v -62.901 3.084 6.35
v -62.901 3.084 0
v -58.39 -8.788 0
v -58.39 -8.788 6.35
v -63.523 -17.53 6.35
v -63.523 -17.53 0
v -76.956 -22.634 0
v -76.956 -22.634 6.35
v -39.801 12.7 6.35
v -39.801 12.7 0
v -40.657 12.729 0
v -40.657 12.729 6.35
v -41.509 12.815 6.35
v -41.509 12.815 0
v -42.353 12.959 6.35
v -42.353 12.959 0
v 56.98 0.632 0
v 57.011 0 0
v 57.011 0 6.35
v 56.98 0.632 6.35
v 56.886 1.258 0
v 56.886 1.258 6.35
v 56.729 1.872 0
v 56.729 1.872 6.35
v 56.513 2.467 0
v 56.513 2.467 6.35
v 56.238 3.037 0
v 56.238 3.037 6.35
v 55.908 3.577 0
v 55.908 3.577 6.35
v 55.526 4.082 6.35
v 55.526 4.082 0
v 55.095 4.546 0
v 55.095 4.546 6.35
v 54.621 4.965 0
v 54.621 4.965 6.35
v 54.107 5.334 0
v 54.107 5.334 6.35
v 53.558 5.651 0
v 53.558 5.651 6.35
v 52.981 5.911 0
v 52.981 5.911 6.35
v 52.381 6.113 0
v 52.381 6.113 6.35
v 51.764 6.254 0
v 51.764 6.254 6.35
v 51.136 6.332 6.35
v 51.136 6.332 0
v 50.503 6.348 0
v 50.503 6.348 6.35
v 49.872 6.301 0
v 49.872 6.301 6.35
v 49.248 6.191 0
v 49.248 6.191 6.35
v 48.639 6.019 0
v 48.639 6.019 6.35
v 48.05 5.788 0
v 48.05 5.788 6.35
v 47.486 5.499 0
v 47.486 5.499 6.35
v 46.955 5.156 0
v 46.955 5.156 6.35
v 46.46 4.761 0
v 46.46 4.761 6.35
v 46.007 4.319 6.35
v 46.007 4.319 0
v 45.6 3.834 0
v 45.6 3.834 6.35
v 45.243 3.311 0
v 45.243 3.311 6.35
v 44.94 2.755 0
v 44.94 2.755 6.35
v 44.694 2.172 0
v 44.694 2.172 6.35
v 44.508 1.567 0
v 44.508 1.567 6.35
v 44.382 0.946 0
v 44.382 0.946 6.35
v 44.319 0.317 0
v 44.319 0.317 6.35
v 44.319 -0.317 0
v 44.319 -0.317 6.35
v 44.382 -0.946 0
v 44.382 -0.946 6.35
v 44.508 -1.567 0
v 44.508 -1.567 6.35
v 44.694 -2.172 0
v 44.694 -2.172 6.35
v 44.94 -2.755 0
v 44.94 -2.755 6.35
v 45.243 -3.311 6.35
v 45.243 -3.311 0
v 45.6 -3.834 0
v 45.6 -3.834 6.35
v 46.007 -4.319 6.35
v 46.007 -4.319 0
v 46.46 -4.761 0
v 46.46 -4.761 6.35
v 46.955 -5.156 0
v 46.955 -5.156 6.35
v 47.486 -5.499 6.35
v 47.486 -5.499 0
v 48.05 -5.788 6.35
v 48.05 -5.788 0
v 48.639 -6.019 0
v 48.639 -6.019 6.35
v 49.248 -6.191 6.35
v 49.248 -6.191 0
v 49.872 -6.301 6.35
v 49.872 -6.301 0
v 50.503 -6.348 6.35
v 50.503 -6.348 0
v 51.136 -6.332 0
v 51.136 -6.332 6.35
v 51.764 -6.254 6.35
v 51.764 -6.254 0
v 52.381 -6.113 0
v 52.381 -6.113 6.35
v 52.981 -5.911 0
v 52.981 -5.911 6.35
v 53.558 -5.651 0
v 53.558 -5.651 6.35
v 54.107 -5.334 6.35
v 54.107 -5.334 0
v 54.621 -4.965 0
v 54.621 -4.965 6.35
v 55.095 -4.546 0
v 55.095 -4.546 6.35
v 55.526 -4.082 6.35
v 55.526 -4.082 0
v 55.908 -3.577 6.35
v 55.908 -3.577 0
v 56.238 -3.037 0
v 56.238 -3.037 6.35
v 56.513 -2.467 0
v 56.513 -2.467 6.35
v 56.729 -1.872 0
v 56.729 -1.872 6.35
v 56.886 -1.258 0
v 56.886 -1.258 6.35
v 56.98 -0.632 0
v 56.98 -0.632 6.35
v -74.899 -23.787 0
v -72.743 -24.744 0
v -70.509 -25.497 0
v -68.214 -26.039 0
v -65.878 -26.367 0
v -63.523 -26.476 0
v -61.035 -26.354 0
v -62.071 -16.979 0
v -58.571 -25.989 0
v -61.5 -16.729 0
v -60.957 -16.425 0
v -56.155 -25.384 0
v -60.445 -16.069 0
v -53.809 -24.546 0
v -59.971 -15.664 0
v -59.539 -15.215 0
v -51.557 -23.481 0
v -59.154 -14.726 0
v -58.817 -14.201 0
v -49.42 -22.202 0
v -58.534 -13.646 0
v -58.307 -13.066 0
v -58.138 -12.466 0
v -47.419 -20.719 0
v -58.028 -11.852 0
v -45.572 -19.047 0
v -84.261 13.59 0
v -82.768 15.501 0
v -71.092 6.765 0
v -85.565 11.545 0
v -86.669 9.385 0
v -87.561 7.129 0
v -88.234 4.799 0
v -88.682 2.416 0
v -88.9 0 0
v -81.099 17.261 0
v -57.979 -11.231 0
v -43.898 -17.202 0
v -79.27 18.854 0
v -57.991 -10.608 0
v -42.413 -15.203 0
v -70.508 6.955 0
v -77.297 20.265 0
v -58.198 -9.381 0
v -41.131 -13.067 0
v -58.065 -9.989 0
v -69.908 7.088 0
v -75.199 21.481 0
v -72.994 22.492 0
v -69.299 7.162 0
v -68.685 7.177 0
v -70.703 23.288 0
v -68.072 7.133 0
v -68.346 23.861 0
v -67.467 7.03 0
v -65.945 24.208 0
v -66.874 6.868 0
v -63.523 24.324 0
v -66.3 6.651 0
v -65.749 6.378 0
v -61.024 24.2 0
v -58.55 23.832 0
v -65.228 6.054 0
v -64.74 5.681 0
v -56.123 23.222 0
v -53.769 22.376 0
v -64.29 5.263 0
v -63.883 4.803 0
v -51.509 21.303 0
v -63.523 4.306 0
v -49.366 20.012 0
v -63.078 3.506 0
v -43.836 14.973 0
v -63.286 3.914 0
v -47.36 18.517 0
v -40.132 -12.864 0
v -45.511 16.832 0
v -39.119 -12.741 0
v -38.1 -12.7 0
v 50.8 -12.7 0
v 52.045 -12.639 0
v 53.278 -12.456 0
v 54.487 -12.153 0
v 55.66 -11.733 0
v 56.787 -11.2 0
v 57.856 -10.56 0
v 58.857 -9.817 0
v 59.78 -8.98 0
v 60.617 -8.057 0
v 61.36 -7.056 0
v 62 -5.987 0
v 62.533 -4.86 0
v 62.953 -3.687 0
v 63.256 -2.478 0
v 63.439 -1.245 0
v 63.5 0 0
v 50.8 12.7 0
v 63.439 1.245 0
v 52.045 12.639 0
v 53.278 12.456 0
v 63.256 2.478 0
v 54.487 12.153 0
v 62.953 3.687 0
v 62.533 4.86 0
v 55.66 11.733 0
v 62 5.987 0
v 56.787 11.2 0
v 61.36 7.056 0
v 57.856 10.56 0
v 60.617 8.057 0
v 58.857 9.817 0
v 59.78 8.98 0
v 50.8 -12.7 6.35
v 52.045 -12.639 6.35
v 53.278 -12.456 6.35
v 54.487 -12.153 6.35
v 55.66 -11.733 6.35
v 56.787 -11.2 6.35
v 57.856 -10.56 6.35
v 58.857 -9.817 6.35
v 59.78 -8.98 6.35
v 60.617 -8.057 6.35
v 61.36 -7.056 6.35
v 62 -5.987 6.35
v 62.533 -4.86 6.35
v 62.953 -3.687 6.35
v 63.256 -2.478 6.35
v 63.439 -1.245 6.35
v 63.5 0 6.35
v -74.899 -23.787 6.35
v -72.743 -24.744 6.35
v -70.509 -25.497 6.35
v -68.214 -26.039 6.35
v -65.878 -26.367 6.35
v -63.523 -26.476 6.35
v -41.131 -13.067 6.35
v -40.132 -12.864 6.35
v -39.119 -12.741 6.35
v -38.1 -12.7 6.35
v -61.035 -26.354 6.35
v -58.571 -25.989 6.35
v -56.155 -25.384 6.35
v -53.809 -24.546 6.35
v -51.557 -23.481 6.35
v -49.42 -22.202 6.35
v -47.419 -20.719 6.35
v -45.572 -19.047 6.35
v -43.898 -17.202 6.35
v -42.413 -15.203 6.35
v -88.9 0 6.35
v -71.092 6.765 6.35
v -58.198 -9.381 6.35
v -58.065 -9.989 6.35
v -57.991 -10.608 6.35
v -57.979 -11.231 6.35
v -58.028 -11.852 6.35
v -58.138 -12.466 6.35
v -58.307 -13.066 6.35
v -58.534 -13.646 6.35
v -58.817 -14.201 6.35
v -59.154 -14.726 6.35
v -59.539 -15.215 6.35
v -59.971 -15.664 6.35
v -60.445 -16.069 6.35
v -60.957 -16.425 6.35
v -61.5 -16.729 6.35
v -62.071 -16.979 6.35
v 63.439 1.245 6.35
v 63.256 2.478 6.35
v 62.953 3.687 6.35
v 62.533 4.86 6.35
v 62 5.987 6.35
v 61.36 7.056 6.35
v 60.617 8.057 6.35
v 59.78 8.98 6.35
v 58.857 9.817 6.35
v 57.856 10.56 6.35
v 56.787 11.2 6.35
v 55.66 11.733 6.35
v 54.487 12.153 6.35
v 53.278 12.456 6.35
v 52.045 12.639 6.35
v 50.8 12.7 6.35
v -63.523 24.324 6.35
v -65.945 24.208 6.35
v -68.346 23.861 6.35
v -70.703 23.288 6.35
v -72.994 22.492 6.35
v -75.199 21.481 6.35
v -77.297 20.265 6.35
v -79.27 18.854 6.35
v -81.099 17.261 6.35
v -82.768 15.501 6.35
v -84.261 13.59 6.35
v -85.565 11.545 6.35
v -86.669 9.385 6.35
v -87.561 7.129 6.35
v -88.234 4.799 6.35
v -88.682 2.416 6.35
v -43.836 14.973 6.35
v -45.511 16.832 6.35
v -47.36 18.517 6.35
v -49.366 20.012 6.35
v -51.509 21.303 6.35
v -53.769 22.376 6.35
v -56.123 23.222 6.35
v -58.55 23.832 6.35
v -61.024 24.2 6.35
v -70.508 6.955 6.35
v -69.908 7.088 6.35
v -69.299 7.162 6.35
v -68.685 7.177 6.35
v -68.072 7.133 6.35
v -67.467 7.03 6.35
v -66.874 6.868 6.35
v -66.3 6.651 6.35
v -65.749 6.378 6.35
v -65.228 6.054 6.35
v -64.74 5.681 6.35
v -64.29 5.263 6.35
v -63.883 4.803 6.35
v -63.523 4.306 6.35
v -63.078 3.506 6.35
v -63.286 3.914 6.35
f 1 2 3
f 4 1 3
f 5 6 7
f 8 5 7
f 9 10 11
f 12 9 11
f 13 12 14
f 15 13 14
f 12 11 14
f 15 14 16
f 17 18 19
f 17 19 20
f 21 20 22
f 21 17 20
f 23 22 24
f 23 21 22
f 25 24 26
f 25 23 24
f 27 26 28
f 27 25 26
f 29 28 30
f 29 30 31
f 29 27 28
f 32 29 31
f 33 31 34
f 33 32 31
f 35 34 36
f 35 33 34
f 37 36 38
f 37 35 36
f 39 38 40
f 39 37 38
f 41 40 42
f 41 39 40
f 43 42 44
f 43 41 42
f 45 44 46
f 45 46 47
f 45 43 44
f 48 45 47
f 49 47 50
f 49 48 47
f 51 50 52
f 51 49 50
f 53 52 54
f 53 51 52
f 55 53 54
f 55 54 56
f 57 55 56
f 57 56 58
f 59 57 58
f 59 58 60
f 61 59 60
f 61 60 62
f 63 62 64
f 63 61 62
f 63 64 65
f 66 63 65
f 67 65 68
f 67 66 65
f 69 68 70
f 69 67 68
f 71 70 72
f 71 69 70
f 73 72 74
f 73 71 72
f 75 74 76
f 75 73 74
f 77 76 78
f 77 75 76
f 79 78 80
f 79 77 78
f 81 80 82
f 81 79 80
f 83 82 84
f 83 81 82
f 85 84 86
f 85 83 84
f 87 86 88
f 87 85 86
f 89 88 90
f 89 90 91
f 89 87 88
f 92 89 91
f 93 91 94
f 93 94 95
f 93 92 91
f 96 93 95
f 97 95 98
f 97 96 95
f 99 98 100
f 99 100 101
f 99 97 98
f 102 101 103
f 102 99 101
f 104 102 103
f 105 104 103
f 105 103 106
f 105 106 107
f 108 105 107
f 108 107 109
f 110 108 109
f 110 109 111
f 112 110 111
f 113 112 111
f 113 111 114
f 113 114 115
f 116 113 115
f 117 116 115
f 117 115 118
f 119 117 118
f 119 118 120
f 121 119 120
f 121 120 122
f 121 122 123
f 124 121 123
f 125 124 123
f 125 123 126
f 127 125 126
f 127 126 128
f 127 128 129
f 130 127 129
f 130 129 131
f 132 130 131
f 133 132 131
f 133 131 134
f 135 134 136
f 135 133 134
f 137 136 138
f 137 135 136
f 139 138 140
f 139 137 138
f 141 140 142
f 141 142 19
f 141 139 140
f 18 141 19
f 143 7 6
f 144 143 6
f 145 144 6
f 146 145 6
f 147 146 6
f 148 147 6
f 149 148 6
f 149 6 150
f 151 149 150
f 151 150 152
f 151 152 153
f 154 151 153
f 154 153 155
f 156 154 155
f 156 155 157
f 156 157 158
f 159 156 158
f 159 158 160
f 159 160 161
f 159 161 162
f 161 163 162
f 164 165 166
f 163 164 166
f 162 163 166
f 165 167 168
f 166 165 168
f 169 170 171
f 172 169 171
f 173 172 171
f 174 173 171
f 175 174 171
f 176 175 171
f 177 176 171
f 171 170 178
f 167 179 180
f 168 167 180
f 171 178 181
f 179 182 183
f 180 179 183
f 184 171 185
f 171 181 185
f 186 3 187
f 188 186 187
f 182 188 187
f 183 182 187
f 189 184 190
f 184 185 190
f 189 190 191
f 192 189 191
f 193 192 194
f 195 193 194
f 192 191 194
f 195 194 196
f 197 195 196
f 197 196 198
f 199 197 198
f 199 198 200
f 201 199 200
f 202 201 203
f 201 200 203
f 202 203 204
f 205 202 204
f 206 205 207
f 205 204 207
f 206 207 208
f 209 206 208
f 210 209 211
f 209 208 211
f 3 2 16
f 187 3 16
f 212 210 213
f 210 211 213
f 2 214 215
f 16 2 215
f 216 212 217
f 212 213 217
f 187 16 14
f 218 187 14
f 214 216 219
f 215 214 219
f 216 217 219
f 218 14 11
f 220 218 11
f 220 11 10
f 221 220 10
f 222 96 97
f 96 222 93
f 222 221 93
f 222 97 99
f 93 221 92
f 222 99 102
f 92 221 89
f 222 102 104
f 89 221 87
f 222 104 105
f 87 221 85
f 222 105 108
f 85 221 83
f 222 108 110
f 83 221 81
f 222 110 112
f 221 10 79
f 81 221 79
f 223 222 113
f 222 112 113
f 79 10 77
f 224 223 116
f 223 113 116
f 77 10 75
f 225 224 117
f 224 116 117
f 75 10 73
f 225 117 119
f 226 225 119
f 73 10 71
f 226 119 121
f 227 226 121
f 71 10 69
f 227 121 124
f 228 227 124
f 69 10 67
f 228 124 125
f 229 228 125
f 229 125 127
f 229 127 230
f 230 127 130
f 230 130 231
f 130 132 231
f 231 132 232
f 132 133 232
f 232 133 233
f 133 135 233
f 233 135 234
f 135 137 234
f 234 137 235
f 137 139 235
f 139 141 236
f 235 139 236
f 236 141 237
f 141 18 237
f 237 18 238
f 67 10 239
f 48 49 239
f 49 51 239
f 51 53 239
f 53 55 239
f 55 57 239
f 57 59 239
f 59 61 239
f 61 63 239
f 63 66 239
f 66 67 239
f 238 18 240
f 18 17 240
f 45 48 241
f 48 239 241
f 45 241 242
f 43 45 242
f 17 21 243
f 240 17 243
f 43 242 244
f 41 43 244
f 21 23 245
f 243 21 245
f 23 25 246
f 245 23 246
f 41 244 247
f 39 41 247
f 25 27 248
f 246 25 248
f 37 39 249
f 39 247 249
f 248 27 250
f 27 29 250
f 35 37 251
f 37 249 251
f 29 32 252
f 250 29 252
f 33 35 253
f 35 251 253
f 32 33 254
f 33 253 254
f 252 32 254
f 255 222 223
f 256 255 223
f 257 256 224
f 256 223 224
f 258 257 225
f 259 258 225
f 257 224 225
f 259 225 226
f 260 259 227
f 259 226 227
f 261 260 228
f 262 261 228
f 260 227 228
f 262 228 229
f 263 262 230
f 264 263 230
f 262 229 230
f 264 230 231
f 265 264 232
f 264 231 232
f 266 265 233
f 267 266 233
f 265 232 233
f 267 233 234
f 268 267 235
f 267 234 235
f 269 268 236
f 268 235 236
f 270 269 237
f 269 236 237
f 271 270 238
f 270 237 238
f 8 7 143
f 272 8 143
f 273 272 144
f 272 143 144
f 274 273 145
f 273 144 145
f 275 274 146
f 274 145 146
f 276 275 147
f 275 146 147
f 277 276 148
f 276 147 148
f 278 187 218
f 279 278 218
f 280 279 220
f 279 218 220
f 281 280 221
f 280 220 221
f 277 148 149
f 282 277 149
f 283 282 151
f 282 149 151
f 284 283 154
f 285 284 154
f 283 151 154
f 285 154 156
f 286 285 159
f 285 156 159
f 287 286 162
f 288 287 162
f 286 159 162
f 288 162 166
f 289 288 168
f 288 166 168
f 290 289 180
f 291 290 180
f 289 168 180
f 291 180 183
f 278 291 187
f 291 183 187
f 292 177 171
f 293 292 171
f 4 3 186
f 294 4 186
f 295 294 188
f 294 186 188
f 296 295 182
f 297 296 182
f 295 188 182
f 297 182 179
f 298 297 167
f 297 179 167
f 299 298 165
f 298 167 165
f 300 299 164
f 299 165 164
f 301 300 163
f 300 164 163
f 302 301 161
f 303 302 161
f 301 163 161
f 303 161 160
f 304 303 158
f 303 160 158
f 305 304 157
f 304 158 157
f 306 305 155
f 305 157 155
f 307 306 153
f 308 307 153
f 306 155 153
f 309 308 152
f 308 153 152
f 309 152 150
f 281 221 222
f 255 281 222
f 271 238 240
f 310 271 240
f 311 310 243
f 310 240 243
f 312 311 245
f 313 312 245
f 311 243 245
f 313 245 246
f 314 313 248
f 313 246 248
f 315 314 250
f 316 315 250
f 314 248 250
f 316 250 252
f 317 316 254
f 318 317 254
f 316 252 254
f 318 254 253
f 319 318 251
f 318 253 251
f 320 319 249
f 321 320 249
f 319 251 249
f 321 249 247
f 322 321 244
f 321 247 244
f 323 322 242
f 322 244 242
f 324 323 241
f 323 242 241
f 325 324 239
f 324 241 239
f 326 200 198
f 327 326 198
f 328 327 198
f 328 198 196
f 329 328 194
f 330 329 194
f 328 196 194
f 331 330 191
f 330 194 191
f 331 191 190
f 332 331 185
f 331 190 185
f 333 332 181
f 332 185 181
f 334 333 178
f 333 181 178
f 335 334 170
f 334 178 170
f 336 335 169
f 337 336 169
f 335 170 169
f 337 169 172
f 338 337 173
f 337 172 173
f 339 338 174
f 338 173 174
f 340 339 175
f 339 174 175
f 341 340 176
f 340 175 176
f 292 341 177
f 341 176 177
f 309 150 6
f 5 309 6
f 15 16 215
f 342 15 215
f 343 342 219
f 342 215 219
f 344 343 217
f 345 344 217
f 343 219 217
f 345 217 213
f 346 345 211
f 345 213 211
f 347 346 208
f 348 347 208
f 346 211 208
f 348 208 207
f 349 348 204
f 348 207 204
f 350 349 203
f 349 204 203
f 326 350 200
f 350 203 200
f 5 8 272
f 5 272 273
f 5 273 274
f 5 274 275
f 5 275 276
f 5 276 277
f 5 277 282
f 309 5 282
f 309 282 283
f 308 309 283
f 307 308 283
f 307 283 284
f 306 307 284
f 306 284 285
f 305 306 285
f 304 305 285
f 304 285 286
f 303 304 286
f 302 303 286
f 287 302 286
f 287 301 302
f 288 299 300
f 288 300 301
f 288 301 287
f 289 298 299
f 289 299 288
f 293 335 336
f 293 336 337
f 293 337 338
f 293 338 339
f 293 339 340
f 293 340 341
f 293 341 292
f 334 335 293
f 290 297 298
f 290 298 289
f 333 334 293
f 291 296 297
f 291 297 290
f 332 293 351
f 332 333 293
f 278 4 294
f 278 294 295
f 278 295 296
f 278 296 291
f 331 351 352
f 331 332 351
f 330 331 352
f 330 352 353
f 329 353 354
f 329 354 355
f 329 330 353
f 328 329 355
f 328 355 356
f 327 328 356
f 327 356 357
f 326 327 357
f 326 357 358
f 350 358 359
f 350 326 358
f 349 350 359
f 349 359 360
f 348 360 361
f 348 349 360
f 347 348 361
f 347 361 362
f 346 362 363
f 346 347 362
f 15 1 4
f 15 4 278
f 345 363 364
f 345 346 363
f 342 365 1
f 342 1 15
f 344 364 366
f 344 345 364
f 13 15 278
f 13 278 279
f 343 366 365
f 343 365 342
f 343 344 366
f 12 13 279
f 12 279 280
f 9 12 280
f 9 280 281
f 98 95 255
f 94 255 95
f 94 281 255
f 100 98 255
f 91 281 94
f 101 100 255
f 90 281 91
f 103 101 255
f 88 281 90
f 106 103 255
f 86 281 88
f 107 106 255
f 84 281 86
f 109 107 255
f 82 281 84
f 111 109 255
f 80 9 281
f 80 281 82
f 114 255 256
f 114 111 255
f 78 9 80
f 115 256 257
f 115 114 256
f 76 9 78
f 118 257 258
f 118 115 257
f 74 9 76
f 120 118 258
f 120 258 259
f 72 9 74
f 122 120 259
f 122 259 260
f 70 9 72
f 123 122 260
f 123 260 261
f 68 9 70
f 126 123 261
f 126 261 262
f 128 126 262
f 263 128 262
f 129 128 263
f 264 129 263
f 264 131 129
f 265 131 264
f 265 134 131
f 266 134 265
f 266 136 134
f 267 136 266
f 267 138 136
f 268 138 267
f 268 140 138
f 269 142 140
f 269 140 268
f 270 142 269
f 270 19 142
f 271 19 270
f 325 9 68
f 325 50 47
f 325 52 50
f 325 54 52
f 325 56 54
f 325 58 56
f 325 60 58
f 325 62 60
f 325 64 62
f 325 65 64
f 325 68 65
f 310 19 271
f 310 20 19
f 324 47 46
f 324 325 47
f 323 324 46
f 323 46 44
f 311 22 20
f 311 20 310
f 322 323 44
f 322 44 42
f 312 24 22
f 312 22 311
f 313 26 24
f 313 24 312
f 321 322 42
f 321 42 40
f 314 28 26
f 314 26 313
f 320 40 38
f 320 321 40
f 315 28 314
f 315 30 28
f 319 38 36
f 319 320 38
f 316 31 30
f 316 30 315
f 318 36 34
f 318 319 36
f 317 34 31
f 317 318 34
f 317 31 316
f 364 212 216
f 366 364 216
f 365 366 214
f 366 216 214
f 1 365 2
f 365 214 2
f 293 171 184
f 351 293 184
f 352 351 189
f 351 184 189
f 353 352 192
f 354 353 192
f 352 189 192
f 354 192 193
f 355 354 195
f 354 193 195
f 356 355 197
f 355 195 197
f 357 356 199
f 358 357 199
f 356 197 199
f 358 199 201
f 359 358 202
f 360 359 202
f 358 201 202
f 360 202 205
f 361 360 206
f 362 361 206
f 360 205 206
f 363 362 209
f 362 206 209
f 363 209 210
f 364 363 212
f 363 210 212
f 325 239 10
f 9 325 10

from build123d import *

# Parameters (mm, degrees)
F0_R     = 6.35
F1_DEPTH = 6.35


with BuildPart() as f1:
    # F0 (on Top) → F1 (new body)
    with BuildSketch(Plane.XY):
        with BuildLine():
            Line((-63.522818, 11.623597), (-63.522818, 24.323597))
            ThreePointArc((-63.522818, 24.323597), (-81.098645, 17.260726), (-88.9, 0))
            Line((-88.9, 0), (-71.09176, 6.765285))
            ThreePointArc((-71.09176, 6.765285), (-66.87415, 6.86833), (-63.522818, 4.30563))
            Line((-63.522818, 4.30563), (-63.522818, 11.623597))
        make_face()
        with BuildLine():
            ThreePointArc((-76.95588, -22.633602), (-70.508773, -25.496813), (-63.522818, -26.476403))
            Line((-63.522818, -26.476403), (-63.522818, -17.530432))
            Line((-63.522818, -17.530432), (-76.95588, -22.633602))
        make_face()
        with BuildLine():
            ThreePointArc((63.5, 0), (59.780256, 8.980256), (50.8, 12.7))
            Line((50.8, 12.7), (-39.801477, 12.7))
            ThreePointArc((-39.801477, 12.7), (-41.083686, 12.764892), (-42.35279, 12.958907))
            ThreePointArc((-42.35279, 12.958907), (-39.203292, 6.253034), (-38.122818, -1.076403))
            ThreePointArc((-38.122818, -1.076403), (-38.886391, -7.25754), (-41.1312, -13.067043))
            ThreePointArc((-41.1312, -13.067043), (-39.626671, -12.792095), (-38.1, -12.7))
            Line((-38.1, -12.7), (50.8, -12.7))
            ThreePointArc((50.8, -12.7), (59.780256, -8.980256), (63.5, 0))
        make_face()
        with Locations((50.661474, 0)):
            Circle(F0_R, mode=Mode.SUBTRACT)
        with BuildLine():
            ThreePointArc((-38.122818, -1.076403), (-39.203292, 6.253034), (-42.35279, 12.958907))
            ThreePointArc((-42.35279, 12.958907), (-44.282674, 13.516866), (-46.10043, 14.372163))
            Line((-46.10043, 14.372163), (-63.522818, 24.323597))
            Line((-63.522818, 24.323597), (-63.522818, 11.623597))
            Line((-63.522818, 11.623597), (-63.522818, 4.30563))
            ThreePointArc((-63.522818, 4.30563), (-63.178651, 3.711803), (-62.900585, 3.084299))
            Line((-62.900585, 3.084299), (-58.390395, -8.787861))
            ThreePointArc((-58.390395, -8.787861), (-58.53444, -13.645806), (-62.07138, -16.979036))
            Line((-62.07138, -16.979036), (-63.522818, -17.530432))
            Line((-63.522818, -17.530432), (-63.522818, -26.476403))
            Line((-63.522818, -26.476403), (-44.898486, -14.672904))
            ThreePointArc((-44.898486, -14.672904), (-43.079998, -13.717123), (-41.1312, -13.067043))
            ThreePointArc((-41.1312, -13.067043), (-38.886391, -7.25754), (-38.122818, -1.076403))
        make_face()
        with BuildLine():
            ThreePointArc((-46.10043, 14.372163), (-44.282674, 13.516866), (-42.35279, 12.958907))
            ThreePointArc((-42.35279, 12.958907), (-51.509011, 21.302793), (-63.522818, 24.323597))
            Line((-63.522818, 24.323597), (-46.10043, 14.372163))
        make_face()
        with BuildLine():
            ThreePointArc((-63.522818, -26.476403), (-50.472957, -22.867712), (-41.1312, -13.067043))
            ThreePointArc((-41.1312, -13.067043), (-43.079998, -13.717123), (-44.898486, -14.672904))
            Line((-44.898486, -14.672904), (-63.522818, -26.476403))
        make_face()
    extrude(amount=F1_DEPTH)


solid = f1.part
